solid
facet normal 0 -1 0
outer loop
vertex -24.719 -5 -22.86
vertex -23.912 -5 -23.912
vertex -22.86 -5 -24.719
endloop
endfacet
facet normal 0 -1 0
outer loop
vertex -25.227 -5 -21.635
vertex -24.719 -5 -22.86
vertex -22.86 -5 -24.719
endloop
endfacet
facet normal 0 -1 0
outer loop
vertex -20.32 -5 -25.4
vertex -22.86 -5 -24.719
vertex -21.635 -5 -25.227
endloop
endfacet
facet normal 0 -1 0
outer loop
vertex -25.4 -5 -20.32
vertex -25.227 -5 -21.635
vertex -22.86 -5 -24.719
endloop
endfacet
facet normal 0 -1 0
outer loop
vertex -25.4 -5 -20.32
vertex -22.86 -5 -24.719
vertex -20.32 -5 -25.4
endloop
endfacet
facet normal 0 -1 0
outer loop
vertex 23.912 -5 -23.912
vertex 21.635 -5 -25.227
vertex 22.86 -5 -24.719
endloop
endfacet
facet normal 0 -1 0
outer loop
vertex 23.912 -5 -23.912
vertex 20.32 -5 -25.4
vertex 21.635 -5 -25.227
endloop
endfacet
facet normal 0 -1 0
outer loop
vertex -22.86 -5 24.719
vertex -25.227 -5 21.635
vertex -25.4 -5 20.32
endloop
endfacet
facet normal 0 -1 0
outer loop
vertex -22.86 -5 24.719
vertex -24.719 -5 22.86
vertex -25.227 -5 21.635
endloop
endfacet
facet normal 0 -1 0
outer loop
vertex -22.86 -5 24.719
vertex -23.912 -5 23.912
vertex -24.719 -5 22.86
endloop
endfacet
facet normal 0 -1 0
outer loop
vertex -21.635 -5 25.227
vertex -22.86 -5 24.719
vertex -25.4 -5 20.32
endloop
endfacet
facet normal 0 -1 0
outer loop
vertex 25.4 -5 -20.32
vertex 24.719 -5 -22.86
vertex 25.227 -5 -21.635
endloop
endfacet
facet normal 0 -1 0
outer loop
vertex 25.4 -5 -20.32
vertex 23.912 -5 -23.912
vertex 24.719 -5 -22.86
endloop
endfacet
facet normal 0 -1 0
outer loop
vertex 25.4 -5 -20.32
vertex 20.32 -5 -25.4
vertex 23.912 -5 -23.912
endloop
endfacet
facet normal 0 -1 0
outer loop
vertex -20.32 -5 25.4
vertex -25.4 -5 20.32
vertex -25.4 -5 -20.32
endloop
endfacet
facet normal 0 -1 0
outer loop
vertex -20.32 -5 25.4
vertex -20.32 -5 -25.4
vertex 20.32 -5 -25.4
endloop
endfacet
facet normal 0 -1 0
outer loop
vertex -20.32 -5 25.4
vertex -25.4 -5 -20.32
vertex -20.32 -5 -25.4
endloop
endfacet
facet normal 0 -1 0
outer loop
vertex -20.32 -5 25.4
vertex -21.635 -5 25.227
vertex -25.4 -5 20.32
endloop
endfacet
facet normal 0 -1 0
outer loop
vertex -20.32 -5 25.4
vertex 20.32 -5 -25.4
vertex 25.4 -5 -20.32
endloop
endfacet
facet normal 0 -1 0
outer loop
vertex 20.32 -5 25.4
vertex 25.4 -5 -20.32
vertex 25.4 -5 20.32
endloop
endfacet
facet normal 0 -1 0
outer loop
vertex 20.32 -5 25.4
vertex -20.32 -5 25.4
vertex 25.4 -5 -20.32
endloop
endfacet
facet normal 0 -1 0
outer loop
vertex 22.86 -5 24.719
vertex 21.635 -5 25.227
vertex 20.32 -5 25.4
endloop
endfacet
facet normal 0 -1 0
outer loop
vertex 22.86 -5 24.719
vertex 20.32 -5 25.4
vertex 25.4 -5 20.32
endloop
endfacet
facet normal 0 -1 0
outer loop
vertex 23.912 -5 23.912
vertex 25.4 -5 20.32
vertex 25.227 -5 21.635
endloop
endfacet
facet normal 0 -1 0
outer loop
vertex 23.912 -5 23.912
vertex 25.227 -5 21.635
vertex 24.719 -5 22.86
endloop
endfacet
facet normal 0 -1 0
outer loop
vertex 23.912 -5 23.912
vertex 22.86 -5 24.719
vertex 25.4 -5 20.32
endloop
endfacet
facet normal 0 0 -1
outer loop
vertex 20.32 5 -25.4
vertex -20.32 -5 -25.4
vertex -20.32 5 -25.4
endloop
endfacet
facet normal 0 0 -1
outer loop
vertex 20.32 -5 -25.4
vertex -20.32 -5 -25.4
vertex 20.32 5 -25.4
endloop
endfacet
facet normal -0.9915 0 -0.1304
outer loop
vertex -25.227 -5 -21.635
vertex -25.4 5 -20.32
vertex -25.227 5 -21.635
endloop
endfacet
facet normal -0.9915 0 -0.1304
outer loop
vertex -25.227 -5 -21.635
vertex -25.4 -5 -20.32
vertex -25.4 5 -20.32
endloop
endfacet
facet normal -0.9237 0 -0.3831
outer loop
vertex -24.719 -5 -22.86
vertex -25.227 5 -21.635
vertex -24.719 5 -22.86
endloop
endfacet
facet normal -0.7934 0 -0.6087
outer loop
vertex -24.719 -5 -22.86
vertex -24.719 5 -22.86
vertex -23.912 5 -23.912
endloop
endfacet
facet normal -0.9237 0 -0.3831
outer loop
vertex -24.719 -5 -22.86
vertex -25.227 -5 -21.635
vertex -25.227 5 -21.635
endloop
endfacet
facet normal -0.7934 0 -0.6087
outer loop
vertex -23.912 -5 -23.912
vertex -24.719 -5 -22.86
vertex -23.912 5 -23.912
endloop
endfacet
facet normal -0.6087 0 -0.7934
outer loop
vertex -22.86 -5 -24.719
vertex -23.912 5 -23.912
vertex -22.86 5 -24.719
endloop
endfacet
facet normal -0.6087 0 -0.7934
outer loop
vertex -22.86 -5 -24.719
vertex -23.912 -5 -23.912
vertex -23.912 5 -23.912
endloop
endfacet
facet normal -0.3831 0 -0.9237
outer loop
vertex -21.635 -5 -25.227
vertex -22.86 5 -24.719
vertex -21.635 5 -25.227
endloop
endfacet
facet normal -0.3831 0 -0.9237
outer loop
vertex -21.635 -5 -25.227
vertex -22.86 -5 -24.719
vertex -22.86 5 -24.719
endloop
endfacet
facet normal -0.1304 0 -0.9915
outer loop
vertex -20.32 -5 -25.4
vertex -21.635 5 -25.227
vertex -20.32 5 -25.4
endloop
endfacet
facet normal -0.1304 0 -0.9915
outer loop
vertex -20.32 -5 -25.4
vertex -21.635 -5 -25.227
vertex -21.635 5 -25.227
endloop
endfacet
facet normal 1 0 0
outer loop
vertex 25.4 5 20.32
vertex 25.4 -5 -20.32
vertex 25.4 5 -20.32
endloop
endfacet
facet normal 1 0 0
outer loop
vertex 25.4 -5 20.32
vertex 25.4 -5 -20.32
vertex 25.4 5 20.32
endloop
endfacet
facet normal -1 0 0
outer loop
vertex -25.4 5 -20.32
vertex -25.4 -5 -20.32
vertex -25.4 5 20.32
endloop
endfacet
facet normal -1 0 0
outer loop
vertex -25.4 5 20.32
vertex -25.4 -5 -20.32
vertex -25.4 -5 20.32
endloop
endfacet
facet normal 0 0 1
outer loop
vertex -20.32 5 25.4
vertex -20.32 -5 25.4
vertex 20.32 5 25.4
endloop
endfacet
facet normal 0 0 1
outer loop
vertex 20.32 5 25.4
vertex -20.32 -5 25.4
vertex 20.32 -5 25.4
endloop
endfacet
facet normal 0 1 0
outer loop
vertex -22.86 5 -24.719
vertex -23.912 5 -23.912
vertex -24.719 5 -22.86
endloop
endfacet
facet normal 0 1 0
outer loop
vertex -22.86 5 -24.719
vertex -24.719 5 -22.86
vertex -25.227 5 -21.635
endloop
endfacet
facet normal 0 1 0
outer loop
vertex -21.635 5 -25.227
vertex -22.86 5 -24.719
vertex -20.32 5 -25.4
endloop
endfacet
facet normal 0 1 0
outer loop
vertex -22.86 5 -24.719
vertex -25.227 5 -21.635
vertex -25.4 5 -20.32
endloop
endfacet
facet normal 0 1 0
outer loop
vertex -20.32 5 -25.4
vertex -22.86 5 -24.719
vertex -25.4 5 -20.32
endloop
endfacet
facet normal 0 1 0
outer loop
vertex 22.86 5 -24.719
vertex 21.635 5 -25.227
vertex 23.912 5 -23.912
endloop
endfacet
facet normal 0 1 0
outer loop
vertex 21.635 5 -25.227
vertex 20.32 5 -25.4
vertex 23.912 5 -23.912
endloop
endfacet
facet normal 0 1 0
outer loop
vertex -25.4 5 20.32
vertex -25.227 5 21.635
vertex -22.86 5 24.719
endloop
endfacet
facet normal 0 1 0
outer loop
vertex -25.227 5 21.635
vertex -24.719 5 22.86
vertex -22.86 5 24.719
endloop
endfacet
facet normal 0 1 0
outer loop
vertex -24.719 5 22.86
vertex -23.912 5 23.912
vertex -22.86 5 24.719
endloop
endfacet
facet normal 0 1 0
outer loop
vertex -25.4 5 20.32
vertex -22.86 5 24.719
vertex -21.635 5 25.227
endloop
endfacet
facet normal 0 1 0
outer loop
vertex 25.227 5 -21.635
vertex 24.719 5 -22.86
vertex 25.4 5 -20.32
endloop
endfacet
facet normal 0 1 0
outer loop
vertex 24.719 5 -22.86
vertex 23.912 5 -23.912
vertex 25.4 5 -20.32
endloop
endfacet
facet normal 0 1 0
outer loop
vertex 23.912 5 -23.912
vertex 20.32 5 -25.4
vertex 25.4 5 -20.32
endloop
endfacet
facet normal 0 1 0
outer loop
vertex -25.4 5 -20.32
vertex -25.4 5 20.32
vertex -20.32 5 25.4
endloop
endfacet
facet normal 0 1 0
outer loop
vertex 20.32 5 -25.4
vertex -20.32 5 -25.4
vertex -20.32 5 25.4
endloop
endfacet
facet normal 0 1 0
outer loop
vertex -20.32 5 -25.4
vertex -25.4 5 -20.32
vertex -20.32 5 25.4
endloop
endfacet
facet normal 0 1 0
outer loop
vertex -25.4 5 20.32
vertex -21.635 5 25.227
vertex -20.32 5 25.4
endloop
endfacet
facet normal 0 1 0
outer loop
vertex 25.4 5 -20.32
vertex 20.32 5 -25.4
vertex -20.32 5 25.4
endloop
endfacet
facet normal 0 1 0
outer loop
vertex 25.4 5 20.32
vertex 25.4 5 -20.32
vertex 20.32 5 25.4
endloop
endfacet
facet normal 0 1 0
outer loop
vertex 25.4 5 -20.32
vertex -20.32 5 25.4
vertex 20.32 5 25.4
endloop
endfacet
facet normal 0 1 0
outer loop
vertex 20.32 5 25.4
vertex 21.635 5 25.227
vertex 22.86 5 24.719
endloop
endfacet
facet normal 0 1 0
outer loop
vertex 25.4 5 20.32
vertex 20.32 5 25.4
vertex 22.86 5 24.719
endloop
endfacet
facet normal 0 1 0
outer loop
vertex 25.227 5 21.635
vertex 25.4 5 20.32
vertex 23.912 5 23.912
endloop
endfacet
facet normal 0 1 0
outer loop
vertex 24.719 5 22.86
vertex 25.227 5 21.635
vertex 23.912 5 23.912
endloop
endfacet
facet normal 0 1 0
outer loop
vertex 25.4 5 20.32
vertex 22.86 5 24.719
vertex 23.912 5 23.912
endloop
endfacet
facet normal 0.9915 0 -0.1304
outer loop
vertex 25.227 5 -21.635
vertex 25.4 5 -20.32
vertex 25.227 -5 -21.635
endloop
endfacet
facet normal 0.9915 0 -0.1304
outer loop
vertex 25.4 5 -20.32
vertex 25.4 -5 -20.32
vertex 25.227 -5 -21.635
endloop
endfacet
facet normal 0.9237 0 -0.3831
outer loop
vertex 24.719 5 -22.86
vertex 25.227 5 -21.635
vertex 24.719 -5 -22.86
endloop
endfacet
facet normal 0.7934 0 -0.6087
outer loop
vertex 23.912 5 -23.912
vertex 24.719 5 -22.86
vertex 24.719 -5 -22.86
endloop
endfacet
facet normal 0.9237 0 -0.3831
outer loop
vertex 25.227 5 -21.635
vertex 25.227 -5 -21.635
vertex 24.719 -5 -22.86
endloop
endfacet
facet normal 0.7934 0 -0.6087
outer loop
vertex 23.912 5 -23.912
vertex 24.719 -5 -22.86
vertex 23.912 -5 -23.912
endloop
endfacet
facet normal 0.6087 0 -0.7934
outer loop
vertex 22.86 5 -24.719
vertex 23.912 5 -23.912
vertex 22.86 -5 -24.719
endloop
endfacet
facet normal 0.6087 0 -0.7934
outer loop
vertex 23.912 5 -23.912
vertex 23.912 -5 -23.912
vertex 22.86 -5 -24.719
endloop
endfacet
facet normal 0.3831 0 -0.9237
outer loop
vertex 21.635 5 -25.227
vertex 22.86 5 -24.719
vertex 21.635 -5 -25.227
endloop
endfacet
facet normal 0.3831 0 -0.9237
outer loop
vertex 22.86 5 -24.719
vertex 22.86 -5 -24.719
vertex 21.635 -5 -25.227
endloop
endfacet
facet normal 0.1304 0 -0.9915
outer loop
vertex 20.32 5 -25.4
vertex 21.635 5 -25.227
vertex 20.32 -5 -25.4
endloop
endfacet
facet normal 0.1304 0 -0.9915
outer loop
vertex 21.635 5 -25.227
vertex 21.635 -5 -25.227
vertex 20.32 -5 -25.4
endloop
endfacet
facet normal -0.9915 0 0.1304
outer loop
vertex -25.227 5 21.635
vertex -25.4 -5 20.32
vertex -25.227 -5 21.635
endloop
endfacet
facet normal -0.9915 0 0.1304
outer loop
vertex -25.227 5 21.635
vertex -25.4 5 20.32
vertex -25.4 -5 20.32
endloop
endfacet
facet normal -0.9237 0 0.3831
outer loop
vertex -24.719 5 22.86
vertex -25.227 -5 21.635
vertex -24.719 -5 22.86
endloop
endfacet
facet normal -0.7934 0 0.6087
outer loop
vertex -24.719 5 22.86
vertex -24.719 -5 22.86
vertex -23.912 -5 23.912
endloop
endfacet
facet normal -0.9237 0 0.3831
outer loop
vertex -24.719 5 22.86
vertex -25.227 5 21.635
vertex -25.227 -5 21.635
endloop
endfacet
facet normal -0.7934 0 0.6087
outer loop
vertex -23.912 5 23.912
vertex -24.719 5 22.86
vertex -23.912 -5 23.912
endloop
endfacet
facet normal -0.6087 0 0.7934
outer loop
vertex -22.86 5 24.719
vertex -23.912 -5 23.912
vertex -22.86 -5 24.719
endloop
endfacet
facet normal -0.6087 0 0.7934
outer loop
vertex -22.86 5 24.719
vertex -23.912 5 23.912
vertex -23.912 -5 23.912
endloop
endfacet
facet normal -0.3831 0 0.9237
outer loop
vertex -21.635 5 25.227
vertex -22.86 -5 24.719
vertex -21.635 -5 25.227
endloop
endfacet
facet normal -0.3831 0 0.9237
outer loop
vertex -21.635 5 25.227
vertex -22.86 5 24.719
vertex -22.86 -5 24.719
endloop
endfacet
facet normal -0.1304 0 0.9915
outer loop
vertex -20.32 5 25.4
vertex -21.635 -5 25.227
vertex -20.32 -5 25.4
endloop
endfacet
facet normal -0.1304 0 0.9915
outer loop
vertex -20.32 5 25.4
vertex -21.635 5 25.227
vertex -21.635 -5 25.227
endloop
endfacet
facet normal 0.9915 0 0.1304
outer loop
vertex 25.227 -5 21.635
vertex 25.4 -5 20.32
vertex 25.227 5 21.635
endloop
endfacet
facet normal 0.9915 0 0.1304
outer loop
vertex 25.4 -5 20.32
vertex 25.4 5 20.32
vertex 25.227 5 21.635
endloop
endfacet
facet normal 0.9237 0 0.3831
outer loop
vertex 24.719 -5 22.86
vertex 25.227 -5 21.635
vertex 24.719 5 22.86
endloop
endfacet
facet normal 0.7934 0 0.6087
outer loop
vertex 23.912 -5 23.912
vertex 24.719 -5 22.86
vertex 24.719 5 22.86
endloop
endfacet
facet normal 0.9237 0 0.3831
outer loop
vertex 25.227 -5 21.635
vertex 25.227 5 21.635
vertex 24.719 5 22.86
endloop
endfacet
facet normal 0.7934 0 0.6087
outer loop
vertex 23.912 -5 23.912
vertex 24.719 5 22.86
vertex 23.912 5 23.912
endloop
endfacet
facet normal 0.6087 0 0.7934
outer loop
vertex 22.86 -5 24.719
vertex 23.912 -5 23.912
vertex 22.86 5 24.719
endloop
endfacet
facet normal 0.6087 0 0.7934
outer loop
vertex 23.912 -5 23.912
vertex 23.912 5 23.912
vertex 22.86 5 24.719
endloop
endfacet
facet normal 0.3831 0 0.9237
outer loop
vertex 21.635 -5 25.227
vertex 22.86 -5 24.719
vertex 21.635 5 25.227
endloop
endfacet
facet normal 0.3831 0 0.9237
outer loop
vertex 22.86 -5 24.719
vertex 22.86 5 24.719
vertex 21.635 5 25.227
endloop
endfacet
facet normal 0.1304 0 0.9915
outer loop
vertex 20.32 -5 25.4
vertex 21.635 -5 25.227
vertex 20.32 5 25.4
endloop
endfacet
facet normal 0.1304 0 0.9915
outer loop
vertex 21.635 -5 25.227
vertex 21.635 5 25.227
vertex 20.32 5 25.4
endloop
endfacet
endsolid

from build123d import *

# Parameters (mm, degrees)
F0_W          = 50.8
F0_H          = 50.8
F1_DEPTH      = 5
F1_DEPTH_BACK = 5
F2_R          = 5.08


with BuildPart() as f1:
    # F0 (on Front) → F1 (new body, two sides)
    with BuildSketch(Plane.XZ) as f1_sk:
        Rectangle(F0_W, F0_H)
    extrude(amount=F1_DEPTH)
    extrude(f1_sk.sketch, amount=-F1_DEPTH_BACK)

    # F2
    f2_edges = [f1.edges().sort_by_distance(p)[0] for p in [
        (25.4, 0, 25.4),
        (-25.4, 0, 25.4),
        (25.4, 0, -25.4),
        (-25.4, 0, -25.4),
    ]]
    fillet(f2_edges, radius=F2_R)


solid = f1.part
